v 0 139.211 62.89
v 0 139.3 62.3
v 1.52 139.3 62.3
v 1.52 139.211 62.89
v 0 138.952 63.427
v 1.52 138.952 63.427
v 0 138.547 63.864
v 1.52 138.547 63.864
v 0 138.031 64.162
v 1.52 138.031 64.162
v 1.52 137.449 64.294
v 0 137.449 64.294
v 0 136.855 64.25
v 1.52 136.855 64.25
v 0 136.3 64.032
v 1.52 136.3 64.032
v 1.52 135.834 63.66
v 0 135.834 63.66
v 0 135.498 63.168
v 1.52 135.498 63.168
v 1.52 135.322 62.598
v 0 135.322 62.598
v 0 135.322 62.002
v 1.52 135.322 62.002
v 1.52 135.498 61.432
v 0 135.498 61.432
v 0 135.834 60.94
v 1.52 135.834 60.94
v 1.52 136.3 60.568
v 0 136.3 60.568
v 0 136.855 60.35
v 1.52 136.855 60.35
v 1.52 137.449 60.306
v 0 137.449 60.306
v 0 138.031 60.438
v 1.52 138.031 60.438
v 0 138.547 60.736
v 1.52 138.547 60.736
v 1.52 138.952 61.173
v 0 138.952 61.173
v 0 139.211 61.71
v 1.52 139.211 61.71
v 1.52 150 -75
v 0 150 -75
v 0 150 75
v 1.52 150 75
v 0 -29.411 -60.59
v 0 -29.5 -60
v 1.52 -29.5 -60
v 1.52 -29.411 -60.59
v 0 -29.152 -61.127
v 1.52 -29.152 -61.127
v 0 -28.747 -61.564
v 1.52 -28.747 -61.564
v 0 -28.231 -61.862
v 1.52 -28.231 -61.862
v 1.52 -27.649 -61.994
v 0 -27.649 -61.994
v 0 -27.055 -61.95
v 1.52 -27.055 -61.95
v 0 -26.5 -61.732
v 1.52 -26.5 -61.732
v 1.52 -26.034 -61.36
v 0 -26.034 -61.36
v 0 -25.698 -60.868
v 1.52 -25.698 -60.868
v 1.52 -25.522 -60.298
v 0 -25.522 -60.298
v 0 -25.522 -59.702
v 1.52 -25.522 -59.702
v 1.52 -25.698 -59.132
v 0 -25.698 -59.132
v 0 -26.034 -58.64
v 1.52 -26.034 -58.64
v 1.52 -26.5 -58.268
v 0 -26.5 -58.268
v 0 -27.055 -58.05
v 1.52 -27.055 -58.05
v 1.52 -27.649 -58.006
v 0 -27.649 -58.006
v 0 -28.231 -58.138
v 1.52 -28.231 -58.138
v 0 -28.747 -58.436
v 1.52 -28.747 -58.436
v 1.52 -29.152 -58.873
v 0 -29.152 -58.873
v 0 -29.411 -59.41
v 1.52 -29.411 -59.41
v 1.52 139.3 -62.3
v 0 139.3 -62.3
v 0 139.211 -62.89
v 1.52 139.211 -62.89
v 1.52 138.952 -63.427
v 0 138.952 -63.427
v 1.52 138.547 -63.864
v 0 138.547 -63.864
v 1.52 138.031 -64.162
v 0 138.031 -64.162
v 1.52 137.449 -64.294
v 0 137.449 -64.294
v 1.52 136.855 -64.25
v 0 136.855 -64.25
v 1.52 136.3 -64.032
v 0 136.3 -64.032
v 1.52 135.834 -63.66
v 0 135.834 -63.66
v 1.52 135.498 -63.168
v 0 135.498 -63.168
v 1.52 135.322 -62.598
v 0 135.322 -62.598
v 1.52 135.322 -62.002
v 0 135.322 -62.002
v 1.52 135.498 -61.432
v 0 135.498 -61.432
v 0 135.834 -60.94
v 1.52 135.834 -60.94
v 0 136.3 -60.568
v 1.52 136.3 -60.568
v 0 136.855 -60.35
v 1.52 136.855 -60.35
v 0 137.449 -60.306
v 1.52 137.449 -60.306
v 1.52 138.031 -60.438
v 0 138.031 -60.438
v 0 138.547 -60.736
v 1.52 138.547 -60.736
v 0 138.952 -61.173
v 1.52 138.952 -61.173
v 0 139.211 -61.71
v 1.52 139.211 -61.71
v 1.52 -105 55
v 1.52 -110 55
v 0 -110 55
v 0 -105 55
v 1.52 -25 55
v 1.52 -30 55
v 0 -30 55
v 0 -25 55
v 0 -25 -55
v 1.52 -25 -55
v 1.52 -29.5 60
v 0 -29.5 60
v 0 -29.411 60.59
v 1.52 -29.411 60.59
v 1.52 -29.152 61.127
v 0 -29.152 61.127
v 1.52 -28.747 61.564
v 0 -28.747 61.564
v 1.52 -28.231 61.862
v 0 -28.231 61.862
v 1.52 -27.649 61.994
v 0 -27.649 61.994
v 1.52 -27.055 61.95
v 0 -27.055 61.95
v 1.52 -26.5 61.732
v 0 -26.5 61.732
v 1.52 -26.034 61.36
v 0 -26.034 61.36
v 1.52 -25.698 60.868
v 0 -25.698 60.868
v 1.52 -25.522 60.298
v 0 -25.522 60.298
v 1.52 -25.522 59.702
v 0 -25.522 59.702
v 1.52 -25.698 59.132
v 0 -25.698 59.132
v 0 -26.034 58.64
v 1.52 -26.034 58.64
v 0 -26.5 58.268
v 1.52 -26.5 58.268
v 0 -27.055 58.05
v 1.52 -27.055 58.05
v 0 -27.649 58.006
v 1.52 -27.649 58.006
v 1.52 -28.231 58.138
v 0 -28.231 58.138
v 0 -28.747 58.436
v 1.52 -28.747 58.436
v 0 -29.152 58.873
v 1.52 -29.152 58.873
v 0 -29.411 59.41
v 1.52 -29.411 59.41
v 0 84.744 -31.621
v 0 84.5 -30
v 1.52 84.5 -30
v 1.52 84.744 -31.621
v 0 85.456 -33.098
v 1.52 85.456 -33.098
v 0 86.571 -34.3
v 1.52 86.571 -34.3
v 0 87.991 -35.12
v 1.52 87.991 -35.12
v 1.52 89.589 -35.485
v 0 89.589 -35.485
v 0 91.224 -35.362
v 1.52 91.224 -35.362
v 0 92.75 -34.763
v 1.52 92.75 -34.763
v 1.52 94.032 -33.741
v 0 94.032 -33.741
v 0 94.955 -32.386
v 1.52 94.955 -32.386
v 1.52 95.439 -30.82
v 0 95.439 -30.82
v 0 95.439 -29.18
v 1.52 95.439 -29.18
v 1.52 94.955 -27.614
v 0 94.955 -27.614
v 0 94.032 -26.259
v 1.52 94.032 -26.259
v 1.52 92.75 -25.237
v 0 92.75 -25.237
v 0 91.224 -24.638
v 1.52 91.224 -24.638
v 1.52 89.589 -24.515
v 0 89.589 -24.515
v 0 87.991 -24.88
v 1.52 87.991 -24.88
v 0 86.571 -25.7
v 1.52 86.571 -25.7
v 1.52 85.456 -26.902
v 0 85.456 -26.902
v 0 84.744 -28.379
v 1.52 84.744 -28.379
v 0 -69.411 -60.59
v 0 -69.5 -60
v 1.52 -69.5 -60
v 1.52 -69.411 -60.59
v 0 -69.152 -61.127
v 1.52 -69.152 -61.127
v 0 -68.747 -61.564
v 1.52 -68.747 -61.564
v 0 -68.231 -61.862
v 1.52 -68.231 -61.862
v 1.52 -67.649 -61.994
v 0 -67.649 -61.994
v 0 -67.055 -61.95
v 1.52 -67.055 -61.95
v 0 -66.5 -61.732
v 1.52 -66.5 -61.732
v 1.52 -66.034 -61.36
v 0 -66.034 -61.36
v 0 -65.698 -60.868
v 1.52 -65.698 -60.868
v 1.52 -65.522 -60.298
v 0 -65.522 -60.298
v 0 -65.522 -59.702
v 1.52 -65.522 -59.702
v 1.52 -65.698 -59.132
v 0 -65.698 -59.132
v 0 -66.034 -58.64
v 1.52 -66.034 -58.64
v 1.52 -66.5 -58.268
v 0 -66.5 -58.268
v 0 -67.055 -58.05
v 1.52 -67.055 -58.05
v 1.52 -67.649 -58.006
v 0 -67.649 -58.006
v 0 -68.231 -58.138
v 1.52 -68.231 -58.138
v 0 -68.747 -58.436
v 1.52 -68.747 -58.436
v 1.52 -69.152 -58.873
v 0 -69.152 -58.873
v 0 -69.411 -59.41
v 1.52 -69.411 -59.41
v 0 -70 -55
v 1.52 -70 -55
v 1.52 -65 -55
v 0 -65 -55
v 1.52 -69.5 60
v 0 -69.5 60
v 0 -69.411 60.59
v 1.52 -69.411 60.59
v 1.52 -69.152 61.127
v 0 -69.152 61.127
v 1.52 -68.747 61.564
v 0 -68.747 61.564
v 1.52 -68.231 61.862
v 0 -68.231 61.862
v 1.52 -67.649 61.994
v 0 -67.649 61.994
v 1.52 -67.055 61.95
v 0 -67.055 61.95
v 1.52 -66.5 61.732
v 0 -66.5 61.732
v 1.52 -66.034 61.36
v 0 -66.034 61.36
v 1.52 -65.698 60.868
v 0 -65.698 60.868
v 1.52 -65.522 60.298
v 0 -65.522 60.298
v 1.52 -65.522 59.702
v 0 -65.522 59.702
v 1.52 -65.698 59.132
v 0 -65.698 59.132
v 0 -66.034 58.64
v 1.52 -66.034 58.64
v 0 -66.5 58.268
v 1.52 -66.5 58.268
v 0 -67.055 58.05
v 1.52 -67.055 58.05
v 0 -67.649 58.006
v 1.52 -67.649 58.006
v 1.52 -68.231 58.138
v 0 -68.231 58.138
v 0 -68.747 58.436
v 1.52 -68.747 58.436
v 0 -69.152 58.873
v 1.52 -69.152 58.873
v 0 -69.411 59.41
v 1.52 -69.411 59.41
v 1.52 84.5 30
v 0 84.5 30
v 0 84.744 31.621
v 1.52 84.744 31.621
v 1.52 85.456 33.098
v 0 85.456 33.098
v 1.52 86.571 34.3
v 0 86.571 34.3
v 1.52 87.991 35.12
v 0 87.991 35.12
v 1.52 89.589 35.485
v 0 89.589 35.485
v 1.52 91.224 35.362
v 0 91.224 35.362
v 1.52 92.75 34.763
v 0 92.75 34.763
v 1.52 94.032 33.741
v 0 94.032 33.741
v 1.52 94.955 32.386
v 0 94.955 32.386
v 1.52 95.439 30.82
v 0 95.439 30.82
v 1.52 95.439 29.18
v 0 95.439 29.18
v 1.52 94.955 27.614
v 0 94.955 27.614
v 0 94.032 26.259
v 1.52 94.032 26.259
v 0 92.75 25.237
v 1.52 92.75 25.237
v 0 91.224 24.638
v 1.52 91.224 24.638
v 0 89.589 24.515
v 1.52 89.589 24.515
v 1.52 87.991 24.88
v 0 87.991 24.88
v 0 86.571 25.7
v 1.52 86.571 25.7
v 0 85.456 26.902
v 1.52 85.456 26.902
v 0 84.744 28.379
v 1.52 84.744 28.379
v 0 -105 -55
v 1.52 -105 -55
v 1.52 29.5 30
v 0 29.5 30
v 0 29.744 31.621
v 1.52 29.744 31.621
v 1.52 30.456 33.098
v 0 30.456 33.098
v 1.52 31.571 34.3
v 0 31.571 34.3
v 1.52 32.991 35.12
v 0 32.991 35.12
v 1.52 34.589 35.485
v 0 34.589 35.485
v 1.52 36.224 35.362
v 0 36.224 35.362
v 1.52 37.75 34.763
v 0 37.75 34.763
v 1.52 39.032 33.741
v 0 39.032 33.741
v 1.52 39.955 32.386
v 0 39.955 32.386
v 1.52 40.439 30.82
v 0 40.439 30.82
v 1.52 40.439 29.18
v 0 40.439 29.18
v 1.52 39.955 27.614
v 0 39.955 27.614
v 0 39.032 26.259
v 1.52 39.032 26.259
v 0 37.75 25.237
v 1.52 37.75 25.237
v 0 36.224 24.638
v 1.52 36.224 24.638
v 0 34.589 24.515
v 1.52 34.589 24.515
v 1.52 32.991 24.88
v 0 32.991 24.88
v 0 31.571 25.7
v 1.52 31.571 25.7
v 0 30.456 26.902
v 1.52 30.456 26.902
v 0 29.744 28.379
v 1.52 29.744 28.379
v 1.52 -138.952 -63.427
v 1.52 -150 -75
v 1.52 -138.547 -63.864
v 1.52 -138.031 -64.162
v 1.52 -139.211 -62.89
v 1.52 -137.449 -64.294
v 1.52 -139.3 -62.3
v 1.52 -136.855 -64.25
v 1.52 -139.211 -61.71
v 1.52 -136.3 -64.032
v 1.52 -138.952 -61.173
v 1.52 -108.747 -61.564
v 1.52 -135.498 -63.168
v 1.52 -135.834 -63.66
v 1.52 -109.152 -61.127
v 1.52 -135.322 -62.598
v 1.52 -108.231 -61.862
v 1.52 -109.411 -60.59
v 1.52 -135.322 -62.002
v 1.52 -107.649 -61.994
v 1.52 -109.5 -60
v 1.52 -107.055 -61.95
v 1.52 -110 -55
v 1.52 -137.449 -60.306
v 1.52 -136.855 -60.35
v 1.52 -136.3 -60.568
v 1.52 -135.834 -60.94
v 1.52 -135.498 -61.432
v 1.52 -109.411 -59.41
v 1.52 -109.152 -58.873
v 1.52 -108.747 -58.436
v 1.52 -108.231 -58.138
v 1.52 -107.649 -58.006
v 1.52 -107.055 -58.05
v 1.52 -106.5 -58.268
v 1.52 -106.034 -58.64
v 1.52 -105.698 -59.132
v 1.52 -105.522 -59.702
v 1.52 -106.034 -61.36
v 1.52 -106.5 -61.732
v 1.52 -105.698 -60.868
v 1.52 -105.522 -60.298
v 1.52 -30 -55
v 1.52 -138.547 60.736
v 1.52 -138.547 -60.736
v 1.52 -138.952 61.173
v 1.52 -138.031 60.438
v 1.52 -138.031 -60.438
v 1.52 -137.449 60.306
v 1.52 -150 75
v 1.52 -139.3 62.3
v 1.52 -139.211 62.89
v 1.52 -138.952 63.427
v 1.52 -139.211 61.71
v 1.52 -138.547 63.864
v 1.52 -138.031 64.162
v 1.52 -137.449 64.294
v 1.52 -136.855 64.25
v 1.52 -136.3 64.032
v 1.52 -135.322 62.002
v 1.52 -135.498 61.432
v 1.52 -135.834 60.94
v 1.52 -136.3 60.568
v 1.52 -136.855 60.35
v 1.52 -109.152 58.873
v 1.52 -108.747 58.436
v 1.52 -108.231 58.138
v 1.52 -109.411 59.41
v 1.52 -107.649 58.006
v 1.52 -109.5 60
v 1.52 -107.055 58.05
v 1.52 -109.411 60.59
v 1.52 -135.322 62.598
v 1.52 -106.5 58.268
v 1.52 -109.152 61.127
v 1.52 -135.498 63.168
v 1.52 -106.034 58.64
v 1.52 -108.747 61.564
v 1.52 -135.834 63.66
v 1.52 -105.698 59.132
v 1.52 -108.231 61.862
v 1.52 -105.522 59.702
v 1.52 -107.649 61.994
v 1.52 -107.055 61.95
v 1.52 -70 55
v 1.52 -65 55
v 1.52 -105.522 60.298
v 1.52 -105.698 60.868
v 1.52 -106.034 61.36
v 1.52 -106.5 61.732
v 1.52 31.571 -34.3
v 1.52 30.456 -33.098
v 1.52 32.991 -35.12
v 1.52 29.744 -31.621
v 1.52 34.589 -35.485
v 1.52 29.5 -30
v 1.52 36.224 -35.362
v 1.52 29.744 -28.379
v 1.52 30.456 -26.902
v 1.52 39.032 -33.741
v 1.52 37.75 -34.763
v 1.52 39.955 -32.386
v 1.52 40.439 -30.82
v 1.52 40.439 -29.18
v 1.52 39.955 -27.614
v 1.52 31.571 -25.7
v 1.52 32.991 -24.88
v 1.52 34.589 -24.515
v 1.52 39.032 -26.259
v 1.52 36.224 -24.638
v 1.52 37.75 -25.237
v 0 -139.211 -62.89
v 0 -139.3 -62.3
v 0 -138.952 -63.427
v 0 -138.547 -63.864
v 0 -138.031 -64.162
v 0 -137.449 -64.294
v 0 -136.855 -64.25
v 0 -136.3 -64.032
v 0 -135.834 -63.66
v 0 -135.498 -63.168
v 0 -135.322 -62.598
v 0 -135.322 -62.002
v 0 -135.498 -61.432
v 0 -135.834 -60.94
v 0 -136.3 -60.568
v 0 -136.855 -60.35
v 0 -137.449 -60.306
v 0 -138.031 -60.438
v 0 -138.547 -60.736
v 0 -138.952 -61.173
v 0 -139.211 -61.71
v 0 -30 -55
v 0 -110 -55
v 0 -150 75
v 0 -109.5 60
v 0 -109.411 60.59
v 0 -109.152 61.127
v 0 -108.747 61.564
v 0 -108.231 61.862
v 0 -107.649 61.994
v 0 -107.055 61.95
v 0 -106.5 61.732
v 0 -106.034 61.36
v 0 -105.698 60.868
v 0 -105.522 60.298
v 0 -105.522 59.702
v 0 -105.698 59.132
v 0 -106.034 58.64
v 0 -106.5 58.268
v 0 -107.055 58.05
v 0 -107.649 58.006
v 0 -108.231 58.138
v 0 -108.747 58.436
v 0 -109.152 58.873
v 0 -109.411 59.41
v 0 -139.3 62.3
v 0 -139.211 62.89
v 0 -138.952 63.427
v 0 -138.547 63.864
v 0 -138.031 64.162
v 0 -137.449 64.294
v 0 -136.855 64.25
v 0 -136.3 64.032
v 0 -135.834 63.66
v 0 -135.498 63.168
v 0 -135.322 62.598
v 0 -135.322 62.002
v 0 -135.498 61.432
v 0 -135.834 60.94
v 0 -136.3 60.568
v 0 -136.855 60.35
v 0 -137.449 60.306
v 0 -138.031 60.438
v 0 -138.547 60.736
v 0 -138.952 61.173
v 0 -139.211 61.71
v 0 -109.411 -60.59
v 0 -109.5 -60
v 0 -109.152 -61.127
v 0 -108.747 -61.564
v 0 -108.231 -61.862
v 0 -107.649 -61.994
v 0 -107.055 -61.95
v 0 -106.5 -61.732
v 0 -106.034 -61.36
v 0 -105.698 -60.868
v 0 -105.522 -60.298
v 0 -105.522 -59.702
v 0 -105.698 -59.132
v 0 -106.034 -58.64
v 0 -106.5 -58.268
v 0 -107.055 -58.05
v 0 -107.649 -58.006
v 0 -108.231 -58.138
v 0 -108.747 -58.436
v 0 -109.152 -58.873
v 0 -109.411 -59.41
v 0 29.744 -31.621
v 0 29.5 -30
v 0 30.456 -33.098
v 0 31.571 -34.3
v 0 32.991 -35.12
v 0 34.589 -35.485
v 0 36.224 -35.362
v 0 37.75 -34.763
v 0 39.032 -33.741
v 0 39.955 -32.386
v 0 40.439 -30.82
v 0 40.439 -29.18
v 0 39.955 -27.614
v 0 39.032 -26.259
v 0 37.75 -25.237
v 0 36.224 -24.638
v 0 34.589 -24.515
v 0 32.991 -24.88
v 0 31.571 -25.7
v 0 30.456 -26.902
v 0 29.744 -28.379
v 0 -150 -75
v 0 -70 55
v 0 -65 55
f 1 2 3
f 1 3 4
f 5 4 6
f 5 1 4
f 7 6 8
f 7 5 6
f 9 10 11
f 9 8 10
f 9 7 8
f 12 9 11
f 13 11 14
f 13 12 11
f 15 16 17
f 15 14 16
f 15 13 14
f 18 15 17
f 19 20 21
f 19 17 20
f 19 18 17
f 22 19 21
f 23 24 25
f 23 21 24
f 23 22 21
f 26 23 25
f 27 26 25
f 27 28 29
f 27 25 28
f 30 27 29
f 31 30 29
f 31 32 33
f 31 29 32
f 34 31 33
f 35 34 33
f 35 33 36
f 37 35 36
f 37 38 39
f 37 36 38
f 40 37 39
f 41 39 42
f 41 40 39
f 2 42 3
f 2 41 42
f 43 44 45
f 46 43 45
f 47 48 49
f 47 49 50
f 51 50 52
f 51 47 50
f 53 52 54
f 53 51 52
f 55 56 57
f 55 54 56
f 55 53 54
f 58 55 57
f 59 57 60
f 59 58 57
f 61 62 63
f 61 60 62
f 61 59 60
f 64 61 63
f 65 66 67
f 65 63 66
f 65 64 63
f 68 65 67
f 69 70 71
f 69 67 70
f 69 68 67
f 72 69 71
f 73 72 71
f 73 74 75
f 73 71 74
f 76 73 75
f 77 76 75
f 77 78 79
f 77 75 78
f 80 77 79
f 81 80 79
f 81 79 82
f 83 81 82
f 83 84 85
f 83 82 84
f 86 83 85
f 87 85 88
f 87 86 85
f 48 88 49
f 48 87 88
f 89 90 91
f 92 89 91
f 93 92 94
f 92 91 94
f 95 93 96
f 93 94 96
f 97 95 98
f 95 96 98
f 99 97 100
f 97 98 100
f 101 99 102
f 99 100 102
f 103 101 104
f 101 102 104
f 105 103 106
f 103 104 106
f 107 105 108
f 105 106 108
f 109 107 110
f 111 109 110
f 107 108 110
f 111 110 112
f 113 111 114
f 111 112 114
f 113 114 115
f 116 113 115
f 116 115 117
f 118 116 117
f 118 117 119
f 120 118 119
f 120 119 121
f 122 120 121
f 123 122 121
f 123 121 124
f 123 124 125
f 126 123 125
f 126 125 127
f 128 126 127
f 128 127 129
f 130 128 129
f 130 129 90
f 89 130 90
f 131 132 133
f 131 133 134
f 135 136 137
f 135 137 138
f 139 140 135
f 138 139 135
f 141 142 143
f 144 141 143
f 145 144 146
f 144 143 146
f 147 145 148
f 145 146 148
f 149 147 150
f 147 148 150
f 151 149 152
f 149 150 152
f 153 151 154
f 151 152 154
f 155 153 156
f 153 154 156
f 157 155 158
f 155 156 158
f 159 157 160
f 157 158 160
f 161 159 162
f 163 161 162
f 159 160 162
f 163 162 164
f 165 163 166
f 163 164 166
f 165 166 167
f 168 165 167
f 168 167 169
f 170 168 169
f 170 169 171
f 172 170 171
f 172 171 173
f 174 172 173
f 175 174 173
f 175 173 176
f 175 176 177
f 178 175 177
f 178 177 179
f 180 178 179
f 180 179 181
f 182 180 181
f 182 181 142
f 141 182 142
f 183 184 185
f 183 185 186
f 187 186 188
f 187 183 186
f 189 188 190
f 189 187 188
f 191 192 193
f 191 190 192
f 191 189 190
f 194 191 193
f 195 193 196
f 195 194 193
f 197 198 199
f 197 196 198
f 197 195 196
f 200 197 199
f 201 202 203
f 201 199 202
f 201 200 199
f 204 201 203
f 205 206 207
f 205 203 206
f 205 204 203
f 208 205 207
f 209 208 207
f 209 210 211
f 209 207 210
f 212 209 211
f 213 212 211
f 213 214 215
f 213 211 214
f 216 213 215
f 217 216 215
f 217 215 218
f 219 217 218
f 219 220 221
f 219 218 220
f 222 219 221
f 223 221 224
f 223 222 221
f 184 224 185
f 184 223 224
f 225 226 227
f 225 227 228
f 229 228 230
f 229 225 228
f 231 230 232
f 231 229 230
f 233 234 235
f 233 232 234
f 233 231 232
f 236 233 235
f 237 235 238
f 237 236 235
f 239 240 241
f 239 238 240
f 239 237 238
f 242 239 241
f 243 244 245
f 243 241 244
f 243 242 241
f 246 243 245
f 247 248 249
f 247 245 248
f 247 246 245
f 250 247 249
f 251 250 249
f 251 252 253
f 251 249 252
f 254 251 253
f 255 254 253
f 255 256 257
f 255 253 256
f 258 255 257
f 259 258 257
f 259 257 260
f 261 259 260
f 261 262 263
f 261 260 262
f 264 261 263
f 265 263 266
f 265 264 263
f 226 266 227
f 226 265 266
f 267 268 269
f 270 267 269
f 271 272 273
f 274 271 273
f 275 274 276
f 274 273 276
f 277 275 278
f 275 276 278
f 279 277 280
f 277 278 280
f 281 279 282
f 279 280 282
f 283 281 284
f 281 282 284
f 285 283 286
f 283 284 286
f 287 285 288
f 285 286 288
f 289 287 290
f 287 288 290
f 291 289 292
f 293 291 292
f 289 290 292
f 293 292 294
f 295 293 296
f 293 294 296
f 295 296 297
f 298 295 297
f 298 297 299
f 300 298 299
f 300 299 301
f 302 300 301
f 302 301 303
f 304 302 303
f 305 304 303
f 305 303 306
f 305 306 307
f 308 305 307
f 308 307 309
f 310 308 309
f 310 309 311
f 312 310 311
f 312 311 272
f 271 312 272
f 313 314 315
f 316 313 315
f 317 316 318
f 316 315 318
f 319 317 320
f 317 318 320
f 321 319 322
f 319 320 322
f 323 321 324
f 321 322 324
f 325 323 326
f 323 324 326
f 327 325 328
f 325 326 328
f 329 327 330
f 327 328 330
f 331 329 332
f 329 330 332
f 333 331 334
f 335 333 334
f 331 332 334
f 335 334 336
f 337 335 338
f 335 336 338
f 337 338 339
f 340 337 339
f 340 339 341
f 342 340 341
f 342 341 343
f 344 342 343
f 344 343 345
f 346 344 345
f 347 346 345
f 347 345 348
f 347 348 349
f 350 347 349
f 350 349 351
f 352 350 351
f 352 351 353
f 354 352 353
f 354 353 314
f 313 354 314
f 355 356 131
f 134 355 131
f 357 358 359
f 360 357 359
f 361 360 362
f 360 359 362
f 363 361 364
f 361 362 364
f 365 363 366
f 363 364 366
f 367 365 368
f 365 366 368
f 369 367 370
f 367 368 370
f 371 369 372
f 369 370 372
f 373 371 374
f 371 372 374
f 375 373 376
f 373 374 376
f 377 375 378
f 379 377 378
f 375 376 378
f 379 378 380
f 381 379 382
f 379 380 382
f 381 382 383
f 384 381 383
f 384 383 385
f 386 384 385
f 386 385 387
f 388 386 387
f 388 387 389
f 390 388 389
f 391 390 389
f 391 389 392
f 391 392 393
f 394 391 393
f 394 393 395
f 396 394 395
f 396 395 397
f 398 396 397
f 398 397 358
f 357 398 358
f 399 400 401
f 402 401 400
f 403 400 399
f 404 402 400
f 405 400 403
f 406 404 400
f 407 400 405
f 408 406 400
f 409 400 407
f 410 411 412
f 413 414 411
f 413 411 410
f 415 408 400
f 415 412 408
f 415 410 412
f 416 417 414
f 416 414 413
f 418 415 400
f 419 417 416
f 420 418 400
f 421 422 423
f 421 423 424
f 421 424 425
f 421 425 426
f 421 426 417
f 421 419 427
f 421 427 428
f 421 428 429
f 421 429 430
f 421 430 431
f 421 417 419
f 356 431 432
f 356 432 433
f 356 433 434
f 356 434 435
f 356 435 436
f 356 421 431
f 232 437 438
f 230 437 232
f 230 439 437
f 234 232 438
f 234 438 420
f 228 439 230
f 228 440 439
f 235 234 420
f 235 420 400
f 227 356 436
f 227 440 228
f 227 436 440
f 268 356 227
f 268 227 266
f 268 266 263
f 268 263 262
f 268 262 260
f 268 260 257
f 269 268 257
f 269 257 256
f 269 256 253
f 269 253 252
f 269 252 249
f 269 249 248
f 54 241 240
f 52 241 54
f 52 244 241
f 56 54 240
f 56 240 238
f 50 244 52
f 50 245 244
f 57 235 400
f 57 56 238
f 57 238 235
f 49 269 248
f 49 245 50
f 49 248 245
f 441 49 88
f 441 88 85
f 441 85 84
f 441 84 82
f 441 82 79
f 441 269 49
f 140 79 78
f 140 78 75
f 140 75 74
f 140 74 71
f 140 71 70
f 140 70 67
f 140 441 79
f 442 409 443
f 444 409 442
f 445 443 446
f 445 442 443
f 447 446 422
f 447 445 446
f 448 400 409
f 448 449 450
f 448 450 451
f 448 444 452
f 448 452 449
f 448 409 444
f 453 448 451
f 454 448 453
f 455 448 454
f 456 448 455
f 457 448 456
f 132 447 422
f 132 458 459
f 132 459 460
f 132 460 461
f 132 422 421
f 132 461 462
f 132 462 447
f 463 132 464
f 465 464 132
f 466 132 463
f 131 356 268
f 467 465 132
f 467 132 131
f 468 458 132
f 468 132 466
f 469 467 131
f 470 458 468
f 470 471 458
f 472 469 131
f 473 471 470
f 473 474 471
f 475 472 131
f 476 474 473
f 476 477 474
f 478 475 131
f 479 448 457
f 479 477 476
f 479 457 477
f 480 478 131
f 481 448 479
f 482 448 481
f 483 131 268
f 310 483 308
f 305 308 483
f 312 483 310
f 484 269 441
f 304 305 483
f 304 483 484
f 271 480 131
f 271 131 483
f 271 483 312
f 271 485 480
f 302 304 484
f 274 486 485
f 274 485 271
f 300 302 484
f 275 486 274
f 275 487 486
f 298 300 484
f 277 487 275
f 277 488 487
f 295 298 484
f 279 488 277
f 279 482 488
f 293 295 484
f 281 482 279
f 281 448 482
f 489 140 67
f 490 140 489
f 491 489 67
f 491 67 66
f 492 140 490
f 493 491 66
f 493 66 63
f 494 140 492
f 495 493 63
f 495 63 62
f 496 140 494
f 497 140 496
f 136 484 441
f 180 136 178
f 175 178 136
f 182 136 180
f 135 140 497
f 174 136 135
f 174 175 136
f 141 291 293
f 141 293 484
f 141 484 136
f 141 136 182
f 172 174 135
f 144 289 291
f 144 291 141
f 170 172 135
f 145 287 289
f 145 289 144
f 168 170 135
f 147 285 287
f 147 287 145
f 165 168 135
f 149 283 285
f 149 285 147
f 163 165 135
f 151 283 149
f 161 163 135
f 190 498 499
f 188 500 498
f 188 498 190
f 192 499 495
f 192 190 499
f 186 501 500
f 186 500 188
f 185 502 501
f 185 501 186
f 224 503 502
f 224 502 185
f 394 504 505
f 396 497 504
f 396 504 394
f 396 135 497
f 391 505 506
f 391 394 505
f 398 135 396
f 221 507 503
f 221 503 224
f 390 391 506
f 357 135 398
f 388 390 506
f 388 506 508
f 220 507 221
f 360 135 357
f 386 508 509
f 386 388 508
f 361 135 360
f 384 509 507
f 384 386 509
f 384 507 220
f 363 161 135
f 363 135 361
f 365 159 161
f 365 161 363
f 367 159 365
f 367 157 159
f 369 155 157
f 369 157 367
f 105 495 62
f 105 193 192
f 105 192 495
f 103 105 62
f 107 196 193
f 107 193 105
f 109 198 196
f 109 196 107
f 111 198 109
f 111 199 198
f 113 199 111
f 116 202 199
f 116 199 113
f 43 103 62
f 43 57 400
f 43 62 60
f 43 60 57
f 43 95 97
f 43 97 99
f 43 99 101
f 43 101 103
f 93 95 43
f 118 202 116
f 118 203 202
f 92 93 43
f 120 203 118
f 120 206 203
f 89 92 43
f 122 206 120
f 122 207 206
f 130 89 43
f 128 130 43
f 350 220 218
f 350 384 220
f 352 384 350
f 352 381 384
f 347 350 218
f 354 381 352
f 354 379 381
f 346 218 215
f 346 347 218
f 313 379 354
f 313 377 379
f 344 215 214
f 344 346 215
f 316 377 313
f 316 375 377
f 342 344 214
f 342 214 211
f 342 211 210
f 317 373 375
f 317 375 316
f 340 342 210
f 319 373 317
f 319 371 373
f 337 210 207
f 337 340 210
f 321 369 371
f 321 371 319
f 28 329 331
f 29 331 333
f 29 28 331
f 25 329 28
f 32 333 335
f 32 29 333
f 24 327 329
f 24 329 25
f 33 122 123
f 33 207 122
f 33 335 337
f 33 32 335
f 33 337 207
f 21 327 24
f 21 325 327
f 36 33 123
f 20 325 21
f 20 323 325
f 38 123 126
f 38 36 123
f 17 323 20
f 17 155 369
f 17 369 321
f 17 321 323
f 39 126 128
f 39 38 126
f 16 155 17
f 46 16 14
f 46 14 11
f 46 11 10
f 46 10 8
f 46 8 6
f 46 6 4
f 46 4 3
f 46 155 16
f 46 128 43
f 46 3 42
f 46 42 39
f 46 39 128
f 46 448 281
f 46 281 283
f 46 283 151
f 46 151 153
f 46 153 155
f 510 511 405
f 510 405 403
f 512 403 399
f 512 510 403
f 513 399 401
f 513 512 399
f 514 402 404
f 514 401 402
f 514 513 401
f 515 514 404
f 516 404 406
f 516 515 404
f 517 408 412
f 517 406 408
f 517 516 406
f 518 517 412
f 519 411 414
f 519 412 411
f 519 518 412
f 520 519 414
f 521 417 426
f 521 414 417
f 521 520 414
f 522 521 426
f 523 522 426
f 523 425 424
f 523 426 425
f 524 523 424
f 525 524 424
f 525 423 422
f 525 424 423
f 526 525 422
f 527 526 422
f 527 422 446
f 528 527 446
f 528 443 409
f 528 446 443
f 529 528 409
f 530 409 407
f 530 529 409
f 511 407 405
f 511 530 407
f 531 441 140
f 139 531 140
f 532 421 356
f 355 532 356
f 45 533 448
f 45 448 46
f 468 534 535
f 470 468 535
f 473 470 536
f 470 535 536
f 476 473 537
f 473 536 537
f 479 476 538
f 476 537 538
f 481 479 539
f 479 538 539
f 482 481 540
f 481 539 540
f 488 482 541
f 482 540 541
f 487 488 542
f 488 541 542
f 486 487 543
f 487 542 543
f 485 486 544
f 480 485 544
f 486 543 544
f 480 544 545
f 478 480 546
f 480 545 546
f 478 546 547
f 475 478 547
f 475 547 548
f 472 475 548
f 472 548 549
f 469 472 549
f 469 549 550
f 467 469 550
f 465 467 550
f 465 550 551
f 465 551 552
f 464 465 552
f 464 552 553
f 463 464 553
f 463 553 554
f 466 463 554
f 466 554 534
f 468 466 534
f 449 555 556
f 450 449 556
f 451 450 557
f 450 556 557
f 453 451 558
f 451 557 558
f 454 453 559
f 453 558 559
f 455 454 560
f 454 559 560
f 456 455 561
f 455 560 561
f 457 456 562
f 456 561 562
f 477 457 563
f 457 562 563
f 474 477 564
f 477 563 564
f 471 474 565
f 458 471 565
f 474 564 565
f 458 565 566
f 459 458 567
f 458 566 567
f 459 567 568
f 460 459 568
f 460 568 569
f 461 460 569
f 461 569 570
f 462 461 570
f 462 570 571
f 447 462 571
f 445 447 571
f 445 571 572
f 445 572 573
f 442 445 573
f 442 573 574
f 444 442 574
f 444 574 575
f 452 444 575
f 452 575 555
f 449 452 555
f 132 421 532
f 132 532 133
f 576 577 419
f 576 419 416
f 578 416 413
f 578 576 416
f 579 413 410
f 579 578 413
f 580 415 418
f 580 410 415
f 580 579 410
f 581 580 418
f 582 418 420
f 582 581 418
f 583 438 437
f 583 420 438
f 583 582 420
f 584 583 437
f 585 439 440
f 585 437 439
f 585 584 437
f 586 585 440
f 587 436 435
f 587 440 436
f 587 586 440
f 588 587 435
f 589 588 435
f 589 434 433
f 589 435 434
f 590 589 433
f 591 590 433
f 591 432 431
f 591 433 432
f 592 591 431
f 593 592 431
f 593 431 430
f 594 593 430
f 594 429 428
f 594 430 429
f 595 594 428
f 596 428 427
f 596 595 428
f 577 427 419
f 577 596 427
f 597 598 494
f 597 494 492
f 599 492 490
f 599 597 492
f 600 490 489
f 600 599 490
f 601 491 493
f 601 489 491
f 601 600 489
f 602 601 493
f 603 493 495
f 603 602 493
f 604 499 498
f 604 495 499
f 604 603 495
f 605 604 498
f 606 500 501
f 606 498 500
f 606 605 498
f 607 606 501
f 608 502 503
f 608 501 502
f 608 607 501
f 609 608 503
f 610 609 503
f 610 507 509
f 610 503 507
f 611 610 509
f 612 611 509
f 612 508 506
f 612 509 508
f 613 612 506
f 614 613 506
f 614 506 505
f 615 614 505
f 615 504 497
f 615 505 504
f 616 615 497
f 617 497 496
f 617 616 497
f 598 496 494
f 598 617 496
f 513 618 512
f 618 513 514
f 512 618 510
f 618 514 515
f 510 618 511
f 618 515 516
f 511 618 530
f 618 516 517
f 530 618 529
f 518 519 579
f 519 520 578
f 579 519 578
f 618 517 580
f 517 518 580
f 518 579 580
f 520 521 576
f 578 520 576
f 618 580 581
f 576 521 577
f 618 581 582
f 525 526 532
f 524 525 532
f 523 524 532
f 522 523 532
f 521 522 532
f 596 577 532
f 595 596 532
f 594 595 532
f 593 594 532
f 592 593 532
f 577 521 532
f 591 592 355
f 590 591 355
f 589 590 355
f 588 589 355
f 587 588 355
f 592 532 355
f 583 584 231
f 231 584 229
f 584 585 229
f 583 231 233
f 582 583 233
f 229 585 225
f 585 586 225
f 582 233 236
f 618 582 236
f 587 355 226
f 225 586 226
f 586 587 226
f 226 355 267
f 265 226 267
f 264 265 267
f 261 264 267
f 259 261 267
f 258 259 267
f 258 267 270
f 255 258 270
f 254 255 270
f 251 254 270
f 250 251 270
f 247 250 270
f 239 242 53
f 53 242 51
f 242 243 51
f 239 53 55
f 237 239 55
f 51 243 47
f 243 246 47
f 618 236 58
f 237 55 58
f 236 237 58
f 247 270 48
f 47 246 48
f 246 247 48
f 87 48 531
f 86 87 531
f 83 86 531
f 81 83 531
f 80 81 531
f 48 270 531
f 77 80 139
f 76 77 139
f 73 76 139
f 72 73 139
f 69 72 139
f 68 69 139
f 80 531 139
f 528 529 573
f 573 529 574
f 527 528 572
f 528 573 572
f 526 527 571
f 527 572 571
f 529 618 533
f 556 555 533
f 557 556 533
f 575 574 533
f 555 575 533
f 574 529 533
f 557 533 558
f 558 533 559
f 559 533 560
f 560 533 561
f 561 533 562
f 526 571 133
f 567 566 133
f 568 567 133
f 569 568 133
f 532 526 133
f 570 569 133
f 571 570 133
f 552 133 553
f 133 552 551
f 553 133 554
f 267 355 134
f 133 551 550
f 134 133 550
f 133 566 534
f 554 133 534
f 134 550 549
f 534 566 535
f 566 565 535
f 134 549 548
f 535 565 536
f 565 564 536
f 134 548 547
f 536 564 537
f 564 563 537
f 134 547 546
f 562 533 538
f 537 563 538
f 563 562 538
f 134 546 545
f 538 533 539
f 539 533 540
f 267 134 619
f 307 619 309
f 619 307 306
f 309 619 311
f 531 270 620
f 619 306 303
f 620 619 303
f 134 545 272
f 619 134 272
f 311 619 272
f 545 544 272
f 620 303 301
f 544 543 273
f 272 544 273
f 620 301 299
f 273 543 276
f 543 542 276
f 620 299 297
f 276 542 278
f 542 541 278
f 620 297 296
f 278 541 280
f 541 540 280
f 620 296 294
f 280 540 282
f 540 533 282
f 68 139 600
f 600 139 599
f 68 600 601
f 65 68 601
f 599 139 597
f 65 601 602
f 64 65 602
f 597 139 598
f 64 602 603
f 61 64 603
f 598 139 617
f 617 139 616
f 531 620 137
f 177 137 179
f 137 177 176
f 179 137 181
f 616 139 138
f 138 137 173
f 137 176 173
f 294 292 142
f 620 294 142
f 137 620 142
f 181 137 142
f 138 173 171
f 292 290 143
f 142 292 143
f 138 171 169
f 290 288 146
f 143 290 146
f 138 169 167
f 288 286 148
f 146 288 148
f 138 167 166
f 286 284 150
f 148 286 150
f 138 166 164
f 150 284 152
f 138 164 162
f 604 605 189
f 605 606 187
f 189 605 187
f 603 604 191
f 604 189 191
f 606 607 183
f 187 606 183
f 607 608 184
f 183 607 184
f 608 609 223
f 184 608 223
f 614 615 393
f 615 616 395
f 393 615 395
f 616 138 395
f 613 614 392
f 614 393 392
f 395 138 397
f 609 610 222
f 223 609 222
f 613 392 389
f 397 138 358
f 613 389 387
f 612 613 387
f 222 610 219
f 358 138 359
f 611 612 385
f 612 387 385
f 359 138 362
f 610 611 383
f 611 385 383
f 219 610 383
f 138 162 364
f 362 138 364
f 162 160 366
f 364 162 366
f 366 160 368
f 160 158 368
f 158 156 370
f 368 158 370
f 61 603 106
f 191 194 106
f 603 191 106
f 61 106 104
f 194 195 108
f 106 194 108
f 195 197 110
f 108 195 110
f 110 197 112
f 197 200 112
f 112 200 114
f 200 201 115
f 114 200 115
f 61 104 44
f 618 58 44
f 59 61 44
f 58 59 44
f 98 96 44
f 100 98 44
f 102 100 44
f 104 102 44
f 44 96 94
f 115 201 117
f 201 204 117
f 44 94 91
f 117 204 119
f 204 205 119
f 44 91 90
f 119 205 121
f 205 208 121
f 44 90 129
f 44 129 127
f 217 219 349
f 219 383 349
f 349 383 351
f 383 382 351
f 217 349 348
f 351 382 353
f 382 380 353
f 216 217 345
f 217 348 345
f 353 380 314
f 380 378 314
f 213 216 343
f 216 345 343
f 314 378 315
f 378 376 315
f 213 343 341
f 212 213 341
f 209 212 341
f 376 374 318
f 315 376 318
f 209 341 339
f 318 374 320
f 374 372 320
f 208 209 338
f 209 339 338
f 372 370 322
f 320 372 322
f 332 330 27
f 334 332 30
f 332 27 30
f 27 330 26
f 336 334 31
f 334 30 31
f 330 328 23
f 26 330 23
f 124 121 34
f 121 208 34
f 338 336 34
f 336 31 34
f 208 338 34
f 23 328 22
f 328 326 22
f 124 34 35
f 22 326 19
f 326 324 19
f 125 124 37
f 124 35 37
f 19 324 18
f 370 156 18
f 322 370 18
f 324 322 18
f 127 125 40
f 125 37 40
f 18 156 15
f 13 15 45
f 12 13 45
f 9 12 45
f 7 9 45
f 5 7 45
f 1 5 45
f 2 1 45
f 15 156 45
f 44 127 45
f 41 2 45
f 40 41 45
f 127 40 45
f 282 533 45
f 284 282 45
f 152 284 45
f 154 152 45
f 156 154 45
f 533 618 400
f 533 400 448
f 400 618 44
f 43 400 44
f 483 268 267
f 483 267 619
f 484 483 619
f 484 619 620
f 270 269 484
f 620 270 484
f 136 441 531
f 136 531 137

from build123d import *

# Parameters (mm, degrees)
SKETCH1_W                            = 300
SKETCH1_H                            = 150
BOSS_EXTRUDE1_DEPTH                  = 1.52
F_4_0_4_DIAMETER_HOLE1_D             = 4
MIRROR2_AT_THE_SECOND_PLANE_COPY_1_D = 4
SKETCH14_W                           = 5
SKETCH14_H                           = 110
CUT_EXTRUDE2_DEPTH                   = 168.711986453
F_4_0_4_DIAMETER_HOLE2_D             = 4
SKETCH22_W                           = 5
SKETCH22_H                           = 110
CUT_EXTRUDE3_DEPTH                   = 168.711986453
SKETCH23_W                           = 5
SKETCH23_H                           = 110
CUT_EXTRUDE4_DEPTH                   = 168.711986453
F_4_0_4_DIAMETER_HOLE3_D             = 4
F_4_0_4_DIAMETER_HOLE4_D             = 4
F_11_0_11_DIAMETER_HOLE1_D           = 11


with BuildPart() as part:
    # Sketch1 → Boss-Extrude1 (new body)
    with BuildSketch(Plane.YZ):
        Rectangle(SKETCH1_W, SKETCH1_H)
    extrude(amount=BOSS_EXTRUDE1_DEPTH)

    # Ø4.0 (4) Diameter Hole1 (through all)
    with Locations(Plane.YZ.offset(1.52)):
        with Locations((-137.3, 62.3)):
            f_4_0_4_diameter_hole1 = Hole(F_4_0_4_DIAMETER_HOLE1_D / 2)

    # Mirror2: Ø4.0 (4) Diameter Hole1 across plane
    add(f_4_0_4_diameter_hole1.mirror(Plane.ZX), mode=Mode.SUBTRACT)

    # Mirror2 at the second plane: Ø4.0 (4) Diameter Hole1 across plane
    add(f_4_0_4_diameter_hole1.mirror(Plane.XY), mode=Mode.SUBTRACT)

    # Mirror2 at the second plane copy 1 (through all)
    with Locations(Plane(origin=(1.52, 0, 0), x_dir=(0, -1, 0), z_dir=(1, 0, 0))):
        with Locations((-137.3, 62.3)):
            Hole(MIRROR2_AT_THE_SECOND_PLANE_COPY_1_D / 2)

    # Sketch14 → Cut-Extrude2 (cut, through all)
    with BuildSketch(Plane.YZ.offset(1.52)):
        with Locations((-107.5, 0)):
            Rectangle(SKETCH14_W, SKETCH14_H)
    extrude(amount=-CUT_EXTRUDE2_DEPTH, mode=Mode.SUBTRACT)

    # Ø4.0 (4) Diameter Hole2 (through all)
    with Locations(Plane.YZ.offset(1.52)):
        with Locations((-107.5, 60)):
            f_4_0_4_diameter_hole2 = Hole(F_4_0_4_DIAMETER_HOLE2_D / 2)

    # Mirror4: Ø4.0 (4) Diameter Hole2 across plane
    add(f_4_0_4_diameter_hole2.mirror(Plane.XY), mode=Mode.SUBTRACT)

    # Sketch22 → Cut-Extrude3 (cut, through all)
    with BuildSketch(Plane.YZ.offset(1.52)):
        with Locations((-67.5, 0)):
            Rectangle(SKETCH22_W, SKETCH22_H)
    extrude(amount=-CUT_EXTRUDE3_DEPTH, mode=Mode.SUBTRACT)

    # Sketch23 → Cut-Extrude4 (cut, through all)
    with BuildSketch(Plane.YZ.offset(1.52)):
        with Locations((-27.5, 0)):
            Rectangle(SKETCH23_W, SKETCH23_H)
    extrude(amount=-CUT_EXTRUDE4_DEPTH, mode=Mode.SUBTRACT)

    # Ø4.0 (4) Diameter Hole3 (through all)
    with Locations(Plane.YZ.offset(1.52)):
        with Locations((-67.5, 60)):
            f_4_0_4_diameter_hole3 = Hole(F_4_0_4_DIAMETER_HOLE3_D / 2)

    # Mirror5: Ø4.0 (4) Diameter Hole3 across plane
    add(f_4_0_4_diameter_hole3.mirror(Plane.XY), mode=Mode.SUBTRACT)

    # Ø4.0 (4) Diameter Hole4 (through all)
    with Locations(Plane.YZ.offset(1.52)):
        with Locations((-27.5, 60)):
            f_4_0_4_diameter_hole4 = Hole(F_4_0_4_DIAMETER_HOLE4_D / 2)

    # Mirror6: Ø4.0 (4) Diameter Hole4 across plane
    add(f_4_0_4_diameter_hole4.mirror(Plane.XY), mode=Mode.SUBTRACT)

    # Ø11.0 (11) Diameter Hole1 (through all)
    with Locations(Plane.YZ.offset(1.52)):
        with Locations((35, 30), (90, 30)):
            f_11_0_11_diameter_hole1 = Hole(F_11_0_11_DIAMETER_HOLE1_D / 2)

    # Mirror7: Ø11.0 (11) Diameter Hole1 across plane
    add(f_11_0_11_diameter_hole1.mirror(Plane.XY), mode=Mode.SUBTRACT)


solid = part.part
